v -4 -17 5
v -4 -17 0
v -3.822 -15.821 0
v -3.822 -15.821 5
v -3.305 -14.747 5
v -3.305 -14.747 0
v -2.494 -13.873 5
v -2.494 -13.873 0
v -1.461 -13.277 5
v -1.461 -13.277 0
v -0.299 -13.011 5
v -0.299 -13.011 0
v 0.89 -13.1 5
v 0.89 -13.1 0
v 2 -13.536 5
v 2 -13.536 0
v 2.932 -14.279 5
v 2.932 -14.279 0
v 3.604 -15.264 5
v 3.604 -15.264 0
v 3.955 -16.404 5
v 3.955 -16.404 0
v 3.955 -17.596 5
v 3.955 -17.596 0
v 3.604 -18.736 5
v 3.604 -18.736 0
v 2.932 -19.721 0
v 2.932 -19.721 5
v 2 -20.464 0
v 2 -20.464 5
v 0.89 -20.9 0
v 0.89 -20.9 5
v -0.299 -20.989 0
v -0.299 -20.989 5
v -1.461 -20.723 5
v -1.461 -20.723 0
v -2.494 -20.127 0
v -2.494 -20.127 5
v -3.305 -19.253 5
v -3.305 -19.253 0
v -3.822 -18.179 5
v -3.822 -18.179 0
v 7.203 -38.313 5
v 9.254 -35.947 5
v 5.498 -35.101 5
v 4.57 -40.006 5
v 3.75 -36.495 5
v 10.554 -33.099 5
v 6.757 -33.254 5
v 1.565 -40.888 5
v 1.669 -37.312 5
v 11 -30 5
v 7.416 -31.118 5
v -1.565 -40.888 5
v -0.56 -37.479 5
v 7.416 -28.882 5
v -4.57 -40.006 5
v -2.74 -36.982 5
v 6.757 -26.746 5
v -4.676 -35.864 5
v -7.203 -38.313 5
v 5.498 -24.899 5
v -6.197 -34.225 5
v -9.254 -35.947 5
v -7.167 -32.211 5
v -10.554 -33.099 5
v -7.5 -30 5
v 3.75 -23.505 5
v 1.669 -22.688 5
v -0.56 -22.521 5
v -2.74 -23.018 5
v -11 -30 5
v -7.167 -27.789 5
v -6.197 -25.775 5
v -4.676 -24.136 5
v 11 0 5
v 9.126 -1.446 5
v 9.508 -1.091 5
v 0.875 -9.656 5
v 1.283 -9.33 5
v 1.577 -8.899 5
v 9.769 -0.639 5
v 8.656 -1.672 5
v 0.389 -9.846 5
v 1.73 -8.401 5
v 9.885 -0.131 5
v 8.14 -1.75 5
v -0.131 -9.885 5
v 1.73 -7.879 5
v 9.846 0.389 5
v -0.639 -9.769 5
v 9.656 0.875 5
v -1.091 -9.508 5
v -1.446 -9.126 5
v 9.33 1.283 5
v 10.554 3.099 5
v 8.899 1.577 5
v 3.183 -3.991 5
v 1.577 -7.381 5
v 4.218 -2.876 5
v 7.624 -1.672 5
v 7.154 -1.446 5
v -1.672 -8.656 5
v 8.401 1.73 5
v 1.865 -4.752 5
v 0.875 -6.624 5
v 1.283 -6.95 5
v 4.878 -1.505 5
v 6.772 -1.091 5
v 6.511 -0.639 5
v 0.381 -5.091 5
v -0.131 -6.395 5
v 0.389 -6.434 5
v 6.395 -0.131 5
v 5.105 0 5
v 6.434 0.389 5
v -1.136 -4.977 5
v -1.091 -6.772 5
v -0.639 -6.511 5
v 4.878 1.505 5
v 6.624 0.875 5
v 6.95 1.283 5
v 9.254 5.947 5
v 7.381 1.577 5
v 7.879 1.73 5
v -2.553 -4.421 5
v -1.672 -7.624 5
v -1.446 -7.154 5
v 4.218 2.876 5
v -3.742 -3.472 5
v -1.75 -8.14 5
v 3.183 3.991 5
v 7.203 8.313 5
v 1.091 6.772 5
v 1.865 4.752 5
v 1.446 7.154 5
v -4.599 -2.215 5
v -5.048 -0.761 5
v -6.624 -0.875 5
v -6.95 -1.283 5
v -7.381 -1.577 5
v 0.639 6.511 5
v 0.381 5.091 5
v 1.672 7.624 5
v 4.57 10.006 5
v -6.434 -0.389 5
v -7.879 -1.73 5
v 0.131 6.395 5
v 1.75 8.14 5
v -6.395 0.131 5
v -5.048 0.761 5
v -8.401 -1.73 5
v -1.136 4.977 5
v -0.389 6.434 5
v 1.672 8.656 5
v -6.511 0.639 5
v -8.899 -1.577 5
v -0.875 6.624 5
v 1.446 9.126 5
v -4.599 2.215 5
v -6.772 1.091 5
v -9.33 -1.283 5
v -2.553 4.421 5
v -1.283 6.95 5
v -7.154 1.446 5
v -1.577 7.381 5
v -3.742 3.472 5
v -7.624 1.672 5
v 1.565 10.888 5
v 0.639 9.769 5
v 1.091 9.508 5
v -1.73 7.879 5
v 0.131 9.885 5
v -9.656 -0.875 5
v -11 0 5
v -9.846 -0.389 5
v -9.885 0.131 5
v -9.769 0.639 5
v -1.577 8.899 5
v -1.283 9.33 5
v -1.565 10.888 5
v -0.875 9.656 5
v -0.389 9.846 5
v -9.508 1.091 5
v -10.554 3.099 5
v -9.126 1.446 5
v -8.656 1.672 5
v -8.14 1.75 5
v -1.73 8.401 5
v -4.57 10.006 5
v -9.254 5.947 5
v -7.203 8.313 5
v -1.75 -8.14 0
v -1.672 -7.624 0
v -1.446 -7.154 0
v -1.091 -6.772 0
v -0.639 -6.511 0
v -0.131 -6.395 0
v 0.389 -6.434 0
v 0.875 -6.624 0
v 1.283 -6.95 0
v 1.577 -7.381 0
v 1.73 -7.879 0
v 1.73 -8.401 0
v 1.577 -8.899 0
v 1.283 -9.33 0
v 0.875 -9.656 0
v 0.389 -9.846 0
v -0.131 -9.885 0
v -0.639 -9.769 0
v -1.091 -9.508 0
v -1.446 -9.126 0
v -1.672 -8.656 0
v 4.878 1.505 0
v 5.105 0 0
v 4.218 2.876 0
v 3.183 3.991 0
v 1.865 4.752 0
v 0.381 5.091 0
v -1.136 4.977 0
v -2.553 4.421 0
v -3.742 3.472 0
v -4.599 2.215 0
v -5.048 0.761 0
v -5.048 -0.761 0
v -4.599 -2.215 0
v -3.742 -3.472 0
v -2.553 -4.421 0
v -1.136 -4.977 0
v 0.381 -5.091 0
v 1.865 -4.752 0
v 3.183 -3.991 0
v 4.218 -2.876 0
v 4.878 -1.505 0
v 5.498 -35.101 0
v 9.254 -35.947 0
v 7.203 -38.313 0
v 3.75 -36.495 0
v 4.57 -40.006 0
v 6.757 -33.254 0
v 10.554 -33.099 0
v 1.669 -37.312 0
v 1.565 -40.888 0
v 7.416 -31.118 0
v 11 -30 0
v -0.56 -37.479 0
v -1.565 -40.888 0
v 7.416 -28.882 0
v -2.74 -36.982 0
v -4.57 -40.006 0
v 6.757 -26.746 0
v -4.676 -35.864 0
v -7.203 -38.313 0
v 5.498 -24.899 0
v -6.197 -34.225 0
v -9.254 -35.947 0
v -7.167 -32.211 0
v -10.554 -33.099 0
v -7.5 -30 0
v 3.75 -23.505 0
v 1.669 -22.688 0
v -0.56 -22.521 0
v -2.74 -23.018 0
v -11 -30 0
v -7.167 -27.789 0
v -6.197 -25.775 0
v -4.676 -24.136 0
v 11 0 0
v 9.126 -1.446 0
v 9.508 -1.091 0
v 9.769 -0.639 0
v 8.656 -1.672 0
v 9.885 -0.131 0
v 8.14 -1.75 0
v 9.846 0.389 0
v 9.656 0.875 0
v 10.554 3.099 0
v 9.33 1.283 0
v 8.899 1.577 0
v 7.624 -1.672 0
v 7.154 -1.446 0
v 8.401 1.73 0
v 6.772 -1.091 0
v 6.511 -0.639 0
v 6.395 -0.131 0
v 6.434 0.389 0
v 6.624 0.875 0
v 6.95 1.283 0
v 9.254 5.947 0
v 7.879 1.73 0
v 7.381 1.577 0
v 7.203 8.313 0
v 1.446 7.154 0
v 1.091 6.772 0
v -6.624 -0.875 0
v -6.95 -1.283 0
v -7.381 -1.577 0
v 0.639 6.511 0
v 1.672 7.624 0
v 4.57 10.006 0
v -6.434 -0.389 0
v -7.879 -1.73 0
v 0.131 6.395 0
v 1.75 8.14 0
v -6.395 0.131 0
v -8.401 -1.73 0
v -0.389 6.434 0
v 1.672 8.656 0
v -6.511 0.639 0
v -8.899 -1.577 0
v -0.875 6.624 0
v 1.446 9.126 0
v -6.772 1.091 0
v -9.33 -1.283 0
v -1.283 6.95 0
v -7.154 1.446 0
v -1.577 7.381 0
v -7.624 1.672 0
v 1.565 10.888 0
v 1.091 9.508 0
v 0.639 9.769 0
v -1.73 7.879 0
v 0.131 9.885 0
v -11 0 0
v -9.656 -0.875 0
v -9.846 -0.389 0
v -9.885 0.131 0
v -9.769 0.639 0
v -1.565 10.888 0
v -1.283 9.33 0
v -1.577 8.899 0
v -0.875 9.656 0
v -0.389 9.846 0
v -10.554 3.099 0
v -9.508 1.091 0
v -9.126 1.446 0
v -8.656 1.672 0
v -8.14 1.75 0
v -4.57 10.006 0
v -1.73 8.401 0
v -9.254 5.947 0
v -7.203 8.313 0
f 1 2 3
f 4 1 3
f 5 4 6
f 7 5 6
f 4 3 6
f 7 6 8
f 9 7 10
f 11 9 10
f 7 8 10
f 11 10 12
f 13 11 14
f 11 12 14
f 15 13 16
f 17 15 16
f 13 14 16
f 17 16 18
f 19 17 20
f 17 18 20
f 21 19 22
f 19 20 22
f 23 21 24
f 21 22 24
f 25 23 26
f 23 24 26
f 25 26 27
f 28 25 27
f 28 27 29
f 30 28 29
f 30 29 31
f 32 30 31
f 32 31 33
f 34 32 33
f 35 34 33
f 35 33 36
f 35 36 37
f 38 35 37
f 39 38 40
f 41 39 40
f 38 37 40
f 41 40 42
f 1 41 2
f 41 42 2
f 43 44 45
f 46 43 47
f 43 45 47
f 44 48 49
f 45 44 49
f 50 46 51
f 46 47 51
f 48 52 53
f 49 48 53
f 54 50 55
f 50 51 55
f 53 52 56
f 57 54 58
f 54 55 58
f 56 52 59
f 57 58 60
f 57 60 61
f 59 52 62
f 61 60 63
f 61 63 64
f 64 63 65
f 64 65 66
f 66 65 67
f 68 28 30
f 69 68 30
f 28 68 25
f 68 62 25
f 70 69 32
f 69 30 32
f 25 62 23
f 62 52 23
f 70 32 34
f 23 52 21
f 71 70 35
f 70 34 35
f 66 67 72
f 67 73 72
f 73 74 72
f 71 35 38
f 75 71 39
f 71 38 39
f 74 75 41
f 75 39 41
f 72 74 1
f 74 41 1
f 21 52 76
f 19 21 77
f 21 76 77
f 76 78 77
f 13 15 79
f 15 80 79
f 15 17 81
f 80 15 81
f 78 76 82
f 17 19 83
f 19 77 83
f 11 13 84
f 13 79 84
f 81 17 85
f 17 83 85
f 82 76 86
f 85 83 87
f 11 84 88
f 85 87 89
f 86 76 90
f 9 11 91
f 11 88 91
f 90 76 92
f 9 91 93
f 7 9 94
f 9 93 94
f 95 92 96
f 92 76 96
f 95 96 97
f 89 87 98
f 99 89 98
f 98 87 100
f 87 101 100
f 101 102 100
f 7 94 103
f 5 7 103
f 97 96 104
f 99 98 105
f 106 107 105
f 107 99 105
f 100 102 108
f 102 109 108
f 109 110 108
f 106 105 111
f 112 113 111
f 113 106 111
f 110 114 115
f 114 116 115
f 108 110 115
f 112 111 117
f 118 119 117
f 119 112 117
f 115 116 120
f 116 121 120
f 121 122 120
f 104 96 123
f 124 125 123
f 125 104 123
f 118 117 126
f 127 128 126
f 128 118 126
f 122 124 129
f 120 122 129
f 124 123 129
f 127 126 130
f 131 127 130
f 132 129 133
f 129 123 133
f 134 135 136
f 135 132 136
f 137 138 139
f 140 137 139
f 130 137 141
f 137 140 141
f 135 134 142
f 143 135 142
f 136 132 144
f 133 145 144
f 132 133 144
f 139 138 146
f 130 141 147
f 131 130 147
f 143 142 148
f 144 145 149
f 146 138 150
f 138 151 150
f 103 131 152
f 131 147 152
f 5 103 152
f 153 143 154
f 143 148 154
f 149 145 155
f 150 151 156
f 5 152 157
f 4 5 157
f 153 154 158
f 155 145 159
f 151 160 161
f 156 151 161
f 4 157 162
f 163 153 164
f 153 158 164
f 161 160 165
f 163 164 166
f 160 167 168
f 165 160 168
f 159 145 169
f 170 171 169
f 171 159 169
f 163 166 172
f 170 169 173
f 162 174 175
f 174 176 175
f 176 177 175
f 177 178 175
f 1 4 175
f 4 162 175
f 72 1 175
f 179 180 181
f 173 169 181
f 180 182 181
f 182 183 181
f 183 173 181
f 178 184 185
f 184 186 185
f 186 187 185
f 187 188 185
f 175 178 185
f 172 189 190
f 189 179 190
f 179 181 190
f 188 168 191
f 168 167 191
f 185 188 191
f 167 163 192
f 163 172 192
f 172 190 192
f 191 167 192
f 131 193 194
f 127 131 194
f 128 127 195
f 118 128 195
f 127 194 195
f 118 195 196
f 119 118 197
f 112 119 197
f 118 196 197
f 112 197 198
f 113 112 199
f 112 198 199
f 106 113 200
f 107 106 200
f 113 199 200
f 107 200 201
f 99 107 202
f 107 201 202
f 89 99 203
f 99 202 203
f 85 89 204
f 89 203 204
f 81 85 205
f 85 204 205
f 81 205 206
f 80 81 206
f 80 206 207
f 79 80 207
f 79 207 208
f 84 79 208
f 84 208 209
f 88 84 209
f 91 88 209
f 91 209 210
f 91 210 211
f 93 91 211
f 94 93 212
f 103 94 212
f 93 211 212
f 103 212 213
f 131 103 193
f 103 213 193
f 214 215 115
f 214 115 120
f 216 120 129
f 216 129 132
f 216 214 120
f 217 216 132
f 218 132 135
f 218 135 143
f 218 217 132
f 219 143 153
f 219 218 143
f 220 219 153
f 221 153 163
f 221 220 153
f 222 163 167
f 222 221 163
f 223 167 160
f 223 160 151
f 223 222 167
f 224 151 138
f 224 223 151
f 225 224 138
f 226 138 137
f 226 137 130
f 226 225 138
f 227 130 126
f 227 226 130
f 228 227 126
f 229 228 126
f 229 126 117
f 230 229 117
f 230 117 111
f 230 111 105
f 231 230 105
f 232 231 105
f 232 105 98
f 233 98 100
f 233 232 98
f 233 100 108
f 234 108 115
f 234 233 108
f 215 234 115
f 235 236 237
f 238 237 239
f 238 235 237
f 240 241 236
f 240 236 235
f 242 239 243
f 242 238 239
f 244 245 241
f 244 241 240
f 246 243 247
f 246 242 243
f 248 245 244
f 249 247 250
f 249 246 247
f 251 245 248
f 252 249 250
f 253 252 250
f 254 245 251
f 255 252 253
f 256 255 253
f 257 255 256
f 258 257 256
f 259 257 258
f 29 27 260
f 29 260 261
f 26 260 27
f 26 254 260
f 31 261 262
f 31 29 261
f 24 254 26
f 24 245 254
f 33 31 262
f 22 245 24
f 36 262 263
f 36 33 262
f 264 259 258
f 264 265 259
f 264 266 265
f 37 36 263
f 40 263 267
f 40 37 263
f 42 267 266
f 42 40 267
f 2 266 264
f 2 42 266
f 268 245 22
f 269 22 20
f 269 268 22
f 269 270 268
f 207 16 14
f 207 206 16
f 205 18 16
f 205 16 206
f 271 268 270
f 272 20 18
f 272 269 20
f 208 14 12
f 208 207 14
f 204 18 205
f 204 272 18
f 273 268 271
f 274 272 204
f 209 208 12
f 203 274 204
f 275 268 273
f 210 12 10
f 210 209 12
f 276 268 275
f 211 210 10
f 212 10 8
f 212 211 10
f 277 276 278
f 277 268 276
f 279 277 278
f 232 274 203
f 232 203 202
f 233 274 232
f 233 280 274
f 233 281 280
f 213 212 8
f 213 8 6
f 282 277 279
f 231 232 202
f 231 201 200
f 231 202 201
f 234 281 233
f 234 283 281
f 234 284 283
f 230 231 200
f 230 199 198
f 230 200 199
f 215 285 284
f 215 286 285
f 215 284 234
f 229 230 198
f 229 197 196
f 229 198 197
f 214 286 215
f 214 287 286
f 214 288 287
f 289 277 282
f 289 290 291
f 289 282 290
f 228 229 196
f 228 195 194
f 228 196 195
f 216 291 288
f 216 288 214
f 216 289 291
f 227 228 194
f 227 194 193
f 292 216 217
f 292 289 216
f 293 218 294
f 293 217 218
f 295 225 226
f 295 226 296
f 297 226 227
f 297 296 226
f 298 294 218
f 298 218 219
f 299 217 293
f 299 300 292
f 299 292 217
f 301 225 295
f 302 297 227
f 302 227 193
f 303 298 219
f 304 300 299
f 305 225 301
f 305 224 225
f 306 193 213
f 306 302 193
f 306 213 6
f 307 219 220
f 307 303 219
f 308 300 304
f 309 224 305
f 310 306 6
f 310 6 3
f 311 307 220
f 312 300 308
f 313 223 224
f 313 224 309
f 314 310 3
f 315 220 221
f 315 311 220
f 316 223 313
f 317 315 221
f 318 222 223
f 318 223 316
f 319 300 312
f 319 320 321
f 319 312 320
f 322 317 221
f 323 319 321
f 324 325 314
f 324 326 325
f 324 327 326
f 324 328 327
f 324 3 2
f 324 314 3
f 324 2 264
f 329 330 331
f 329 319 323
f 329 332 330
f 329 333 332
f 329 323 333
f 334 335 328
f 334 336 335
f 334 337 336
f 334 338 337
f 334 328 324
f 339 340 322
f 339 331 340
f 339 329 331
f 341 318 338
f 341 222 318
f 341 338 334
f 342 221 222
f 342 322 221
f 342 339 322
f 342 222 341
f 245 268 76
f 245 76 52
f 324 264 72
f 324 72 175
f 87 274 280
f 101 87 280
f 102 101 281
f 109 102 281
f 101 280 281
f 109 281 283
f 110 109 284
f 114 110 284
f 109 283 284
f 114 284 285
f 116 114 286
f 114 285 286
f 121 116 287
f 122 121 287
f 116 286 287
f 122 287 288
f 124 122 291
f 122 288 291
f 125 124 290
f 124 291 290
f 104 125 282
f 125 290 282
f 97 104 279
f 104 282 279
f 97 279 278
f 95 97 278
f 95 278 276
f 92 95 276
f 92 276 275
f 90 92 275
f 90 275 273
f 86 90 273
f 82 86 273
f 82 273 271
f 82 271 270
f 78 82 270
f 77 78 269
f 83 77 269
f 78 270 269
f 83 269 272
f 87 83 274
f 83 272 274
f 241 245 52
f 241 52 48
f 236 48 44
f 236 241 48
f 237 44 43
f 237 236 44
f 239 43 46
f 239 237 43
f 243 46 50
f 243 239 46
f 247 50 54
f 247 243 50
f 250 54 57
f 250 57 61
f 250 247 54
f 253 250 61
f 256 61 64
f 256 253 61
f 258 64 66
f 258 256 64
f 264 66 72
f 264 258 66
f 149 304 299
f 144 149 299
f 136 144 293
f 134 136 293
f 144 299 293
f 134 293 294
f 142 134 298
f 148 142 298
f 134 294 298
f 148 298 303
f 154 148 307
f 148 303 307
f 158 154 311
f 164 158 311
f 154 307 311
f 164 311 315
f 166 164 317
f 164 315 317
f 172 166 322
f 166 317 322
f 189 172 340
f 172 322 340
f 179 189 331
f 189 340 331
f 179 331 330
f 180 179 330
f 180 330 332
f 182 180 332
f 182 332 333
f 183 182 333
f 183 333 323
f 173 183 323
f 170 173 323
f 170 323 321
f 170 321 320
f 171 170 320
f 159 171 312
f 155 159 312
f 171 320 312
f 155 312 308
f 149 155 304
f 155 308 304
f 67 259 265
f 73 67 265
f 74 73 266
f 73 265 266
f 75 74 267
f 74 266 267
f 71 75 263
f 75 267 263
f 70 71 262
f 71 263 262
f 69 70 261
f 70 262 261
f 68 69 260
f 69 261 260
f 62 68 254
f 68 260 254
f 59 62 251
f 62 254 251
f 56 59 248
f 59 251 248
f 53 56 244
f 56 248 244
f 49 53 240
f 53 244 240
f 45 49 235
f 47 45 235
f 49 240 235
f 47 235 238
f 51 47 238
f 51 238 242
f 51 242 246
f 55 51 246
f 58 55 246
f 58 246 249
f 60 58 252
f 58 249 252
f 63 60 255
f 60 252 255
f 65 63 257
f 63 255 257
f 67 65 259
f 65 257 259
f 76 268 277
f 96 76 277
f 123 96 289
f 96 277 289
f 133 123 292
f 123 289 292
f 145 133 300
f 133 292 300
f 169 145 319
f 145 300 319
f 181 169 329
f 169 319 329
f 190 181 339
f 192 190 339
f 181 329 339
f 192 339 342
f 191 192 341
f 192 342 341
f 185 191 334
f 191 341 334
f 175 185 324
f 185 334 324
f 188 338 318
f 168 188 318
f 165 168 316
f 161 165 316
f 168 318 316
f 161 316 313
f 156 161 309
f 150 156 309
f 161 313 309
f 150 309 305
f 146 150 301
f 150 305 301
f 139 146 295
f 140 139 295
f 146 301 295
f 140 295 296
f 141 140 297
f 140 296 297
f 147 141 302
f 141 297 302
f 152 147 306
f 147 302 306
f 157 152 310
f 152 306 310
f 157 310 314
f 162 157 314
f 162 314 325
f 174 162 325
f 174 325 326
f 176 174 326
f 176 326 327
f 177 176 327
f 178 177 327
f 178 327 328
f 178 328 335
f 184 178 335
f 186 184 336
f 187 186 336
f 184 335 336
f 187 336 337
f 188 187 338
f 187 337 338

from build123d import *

# Parameters (mm, degrees)
ESBO_O1_R                = 11
ESBO_O1_R_2              = 5.105
RESSALTO_EXTRUS_O1_DEPTH = 5
ESBO_O2_R                = 1.75
CORTE_EXTRUS_O1_DEPTH    = 5
PADR_OCIRCULAR1_COUNT    = 4
ESBO_O3_R                = 7.5
ESBO_O3_R_2              = 4
RESSALTO_EXTRUS_O2_DEPTH = 5


with BuildPart() as part:
    # Esboço1 → Ressalto-extrusão1 (new body)
    with BuildSketch(Plane.XY):
        Circle(ESBO_O1_R)
        Circle(ESBO_O1_R_2, mode=Mode.SUBTRACT)
    extrude(amount=RESSALTO_EXTRUS_O1_DEPTH)

    # Esboço2 → Corte-extrusão1 (cut)
    with BuildSketch(Plane(origin=(0, 0, 0), x_dir=(-1, 0, 0), z_dir=(0, 0, -1))):
        with Locations((0, -8.14)):
            Circle(ESBO_O2_R)
    corte_extrus_o1 = extrude(amount=-CORTE_EXTRUS_O1_DEPTH, mode=Mode.SUBTRACT)

    # PadrãoCircular1: Corte-extrusão1 ×4 about axis
    padr_ocircular1_axis = Axis((0, 0, 0), (0, 0, 1))
    for i in range(1, PADR_OCIRCULAR1_COUNT):
        add(corte_extrus_o1.rotate(padr_ocircular1_axis, i * 360 / PADR_OCIRCULAR1_COUNT), mode=Mode.SUBTRACT)

    # Esboço3 → Ressalto-extrusão2 (add)
    with BuildSketch(Plane(origin=(0, 0, 0), x_dir=(-1, 0, 0), z_dir=(0, 0, -1))):
        with BuildLine():
            Line((-11, 0), (-11, -30))
            ThreePointArc((-11, -30), (0, -41), (11, -30))
            Line((11, -30), (11, 0))
            ThreePointArc((11, 0), (0, -11), (-11, 0))
        make_face()
        with Locations((0, -30)):
            Circle(ESBO_O3_R, mode=Mode.SUBTRACT)
        with Locations((0, -17)):
            Circle(ESBO_O3_R_2, mode=Mode.SUBTRACT)
    extrude(amount=-RESSALTO_EXTRUS_O2_DEPTH)


solid = part.part
